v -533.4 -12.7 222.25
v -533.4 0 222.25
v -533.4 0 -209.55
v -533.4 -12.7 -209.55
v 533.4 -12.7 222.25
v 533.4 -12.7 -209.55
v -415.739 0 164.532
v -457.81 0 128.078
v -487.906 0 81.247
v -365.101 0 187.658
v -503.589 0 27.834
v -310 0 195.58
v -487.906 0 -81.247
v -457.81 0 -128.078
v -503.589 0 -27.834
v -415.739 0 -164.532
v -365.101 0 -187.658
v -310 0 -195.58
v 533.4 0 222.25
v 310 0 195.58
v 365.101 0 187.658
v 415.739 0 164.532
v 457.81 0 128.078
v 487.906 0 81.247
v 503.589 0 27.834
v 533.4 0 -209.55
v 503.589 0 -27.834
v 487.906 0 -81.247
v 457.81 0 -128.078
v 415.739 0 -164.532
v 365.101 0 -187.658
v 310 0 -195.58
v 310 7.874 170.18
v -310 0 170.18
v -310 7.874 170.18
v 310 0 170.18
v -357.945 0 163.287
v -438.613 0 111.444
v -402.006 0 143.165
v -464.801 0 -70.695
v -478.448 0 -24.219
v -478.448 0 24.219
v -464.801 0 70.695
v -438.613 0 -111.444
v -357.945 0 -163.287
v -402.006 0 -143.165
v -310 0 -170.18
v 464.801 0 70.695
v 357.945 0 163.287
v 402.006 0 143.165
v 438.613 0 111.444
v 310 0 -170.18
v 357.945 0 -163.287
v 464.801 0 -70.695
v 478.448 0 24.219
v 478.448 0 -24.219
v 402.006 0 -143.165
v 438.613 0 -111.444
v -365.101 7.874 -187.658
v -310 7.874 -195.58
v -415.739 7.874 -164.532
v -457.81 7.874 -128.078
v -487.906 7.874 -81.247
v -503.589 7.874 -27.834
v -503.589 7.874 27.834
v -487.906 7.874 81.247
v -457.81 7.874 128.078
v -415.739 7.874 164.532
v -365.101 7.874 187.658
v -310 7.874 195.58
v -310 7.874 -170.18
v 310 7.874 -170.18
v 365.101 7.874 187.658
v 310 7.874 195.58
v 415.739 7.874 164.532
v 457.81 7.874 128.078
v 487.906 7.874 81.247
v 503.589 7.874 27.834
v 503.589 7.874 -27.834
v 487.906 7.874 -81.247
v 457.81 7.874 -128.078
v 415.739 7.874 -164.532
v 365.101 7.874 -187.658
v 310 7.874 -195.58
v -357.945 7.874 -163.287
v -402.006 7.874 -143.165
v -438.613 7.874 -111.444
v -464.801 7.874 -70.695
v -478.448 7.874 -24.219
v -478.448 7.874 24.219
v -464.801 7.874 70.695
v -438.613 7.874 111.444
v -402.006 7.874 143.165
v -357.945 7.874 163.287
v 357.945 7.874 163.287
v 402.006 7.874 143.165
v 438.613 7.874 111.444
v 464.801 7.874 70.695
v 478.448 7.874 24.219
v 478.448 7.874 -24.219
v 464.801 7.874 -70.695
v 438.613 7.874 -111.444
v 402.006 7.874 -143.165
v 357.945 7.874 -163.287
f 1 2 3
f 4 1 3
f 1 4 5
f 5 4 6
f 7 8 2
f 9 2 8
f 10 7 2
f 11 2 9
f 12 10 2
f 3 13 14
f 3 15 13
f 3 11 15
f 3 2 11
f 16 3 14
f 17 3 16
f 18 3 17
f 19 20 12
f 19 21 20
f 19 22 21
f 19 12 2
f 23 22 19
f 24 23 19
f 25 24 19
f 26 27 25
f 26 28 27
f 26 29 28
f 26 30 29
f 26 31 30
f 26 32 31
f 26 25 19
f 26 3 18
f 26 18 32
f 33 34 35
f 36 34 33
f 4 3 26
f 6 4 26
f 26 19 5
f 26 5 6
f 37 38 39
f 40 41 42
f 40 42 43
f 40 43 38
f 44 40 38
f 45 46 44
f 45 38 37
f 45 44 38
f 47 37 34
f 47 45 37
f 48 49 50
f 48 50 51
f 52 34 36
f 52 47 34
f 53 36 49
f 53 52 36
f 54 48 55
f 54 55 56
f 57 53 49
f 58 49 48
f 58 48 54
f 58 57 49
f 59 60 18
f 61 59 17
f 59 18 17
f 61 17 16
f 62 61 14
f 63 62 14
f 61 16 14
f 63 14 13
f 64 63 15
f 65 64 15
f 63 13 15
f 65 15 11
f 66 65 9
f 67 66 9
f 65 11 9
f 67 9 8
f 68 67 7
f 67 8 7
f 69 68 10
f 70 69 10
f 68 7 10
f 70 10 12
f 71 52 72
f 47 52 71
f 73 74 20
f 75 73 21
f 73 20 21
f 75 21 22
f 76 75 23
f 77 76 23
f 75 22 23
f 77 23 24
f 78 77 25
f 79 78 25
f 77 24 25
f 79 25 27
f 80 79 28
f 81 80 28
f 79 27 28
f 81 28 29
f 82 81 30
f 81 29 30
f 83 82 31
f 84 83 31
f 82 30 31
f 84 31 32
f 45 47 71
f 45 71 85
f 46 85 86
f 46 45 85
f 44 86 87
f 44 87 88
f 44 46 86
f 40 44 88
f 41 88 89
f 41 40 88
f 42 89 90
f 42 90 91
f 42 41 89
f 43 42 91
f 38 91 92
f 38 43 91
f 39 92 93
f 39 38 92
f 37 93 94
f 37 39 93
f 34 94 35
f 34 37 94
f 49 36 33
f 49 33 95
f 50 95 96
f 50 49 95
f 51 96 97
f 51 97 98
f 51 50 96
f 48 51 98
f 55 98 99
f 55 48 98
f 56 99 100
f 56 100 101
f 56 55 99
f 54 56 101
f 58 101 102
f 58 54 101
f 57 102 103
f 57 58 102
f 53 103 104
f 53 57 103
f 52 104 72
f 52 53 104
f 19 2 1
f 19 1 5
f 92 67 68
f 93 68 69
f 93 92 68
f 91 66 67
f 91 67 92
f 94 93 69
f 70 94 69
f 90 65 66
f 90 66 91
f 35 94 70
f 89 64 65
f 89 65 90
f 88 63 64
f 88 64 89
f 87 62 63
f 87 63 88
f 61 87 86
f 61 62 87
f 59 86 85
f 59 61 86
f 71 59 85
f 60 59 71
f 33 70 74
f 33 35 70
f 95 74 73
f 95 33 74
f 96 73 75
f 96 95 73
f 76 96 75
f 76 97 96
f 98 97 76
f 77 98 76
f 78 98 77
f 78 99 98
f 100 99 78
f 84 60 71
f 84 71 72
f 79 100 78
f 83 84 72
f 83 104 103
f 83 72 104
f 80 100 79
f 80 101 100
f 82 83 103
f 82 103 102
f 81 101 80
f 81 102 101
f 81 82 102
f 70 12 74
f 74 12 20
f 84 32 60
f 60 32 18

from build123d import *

# Parameters (mm, degrees)
TRAIN_TRACK_DEPTH   = 7.874
TRACK_BASE_SKETCH_W = 1066.8
TRACK_BASE_SKETCH_H = 431.8
TRACK_BASE_DEPTH    = 12.7


with BuildPart() as part:
    # Track Sketch → Train Track (new body)
    with BuildSketch(Plane(origin=(0, 0, 0), x_dir=(1, 0, 0), z_dir=(0, 1, 0))):
        with BuildLine():
            Line((-310, -195.58), (310, -195.58))
            ThreePointArc((310, -195.58), (505.58, 0), (310, 195.58))
            Line((310, 195.58), (-310, 195.58))
            ThreePointArc((-310, 195.58), (-505.58, 0), (-310, -195.58))
        make_face()
        with BuildLine():
            Line((-310, -170.18), (310, -170.18))
            ThreePointArc((310, -170.18), (480.18, 0), (310, 170.18))
            Line((310, 170.18), (-310, 170.18))
            ThreePointArc((-310, 170.18), (-480.18, 0), (-310, -170.18))
        make_face(mode=Mode.SUBTRACT)
    extrude(amount=TRAIN_TRACK_DEPTH)

    # Track Base Sketch → Track Base (add)
    with BuildSketch(Plane(origin=(0, 0, 0), x_dir=(1, 0, 0), z_dir=(0, 1, 0))):
        with Locations((0, -6.35)):
            Rectangle(TRACK_BASE_SKETCH_W, TRACK_BASE_SKETCH_H)
    extrude(amount=-TRACK_BASE_DEPTH)


solid = part.part
